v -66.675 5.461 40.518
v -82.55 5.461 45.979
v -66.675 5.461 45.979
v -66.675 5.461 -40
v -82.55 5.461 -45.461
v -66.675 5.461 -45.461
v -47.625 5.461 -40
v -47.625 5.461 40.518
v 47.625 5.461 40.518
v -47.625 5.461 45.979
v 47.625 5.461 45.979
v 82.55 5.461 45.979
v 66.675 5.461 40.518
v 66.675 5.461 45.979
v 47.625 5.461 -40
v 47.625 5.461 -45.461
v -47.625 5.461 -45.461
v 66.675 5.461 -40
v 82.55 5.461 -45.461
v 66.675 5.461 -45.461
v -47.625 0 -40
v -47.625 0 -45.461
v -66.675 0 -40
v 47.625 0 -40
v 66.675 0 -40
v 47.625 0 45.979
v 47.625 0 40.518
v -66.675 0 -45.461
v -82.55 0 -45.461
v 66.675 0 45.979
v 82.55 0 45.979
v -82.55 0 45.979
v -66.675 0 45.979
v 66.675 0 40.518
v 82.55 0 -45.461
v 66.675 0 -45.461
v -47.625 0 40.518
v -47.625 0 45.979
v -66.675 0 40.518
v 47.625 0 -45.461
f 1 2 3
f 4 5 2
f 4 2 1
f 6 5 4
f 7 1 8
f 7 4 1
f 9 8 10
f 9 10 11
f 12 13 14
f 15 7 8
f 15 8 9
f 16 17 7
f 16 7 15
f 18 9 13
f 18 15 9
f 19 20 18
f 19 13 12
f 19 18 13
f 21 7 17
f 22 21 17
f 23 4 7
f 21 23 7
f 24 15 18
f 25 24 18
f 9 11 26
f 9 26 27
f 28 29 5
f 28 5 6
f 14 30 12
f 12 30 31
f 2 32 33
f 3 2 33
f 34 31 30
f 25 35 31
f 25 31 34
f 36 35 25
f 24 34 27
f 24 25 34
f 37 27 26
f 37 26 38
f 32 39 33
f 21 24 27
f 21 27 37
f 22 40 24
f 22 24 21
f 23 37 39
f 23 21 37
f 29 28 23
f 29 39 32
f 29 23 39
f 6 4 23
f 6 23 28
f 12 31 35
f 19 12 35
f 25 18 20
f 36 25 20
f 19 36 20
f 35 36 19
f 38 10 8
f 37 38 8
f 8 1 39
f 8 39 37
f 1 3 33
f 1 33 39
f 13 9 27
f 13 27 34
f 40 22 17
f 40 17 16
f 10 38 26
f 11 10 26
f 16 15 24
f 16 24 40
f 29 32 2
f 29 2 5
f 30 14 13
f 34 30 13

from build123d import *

# Parameters (mm, degrees)
SKETCH1_W           = 165.1
SKETCH1_H           = 91.44
BOSS_EXTRUDE1_DEPTH = 5.461
SKETCH2_W           = 19.05
SKETCH2_H           = 5.461
CUT_EXTRUDE1_DEPTH  = 6.461
BOSS_EXTRUDE2_DEPTH = 5.461


with BuildPart() as part:
    # Sketch1 → Boss-Extrude1 (new body)
    with BuildSketch(Plane(origin=(0, 0, 0), x_dir=(1, 0, 0), z_dir=(0, 1, 0))):
        with Locations((0, -0.259)):
            Rectangle(SKETCH1_W, SKETCH1_H)
        with BuildLine():
            Line((-47.5, 40), (47.5, 40))
            ThreePointArc((47.5, 40), (52.803300859, 37.803300859), (55, 32.5))
            Line((55, 32.5), (55, -32.5))
            ThreePointArc((55, -32.5), (52.803300859, -37.803300859), (47.5, -40))
            Line((47.5, -40), (-47.5, -40))
            ThreePointArc((-47.5, -40), (-52.803300859, -37.803300859), (-55, -32.5))
            Line((-55, -32.5), (-55, 32.5))
            ThreePointArc((-55, 32.5), (-52.803300859, 37.803300859), (-47.5, 40))
        make_face(mode=Mode.SUBTRACT)
    extrude(amount=BOSS_EXTRUDE1_DEPTH)

    # Sketch2 → Cut-Extrude1 (cut, through all)
    with BuildSketch(Plane(origin=(0, 5.461, 0), x_dir=(1, 0, 0), z_dir=(0, 1, 0))):
        with Locations((-57.15, 42.7305)):
            Rectangle(SKETCH2_W, SKETCH2_H)
        with Locations((-57.15, -43.2485)):
            Rectangle(SKETCH2_W, SKETCH2_H)
        with Locations((57.15, -43.2485)):
            Rectangle(SKETCH2_W, SKETCH2_H)
        with Locations((57.15, 42.7305)):
            Rectangle(SKETCH2_W, SKETCH2_H)
    extrude(amount=-CUT_EXTRUDE1_DEPTH, mode=Mode.SUBTRACT)

    # Sketch1<3> → Boss-Extrude2 (add)
    with BuildSketch(Plane(origin=(0, 0, 0), x_dir=(1, 0, 0), z_dir=(0, 1, 0))):
        with BuildLine():
            Line((-47.5, 40), (47.5, 40))
            ThreePointArc((47.5, 40), (52.803300859, 37.803300859), (55, 32.5))
            Line((55, 32.5), (55, -32.5))
            ThreePointArc((55, -32.5), (52.803300859, -37.803300859), (47.5, -40))
            Line((47.5, -40), (-47.5, -40))
            ThreePointArc((-47.5, -40), (-52.803300859, -37.803300859), (-55, -32.5))
            Line((-55, -32.5), (-55, 32.5))
            ThreePointArc((-55, 32.5), (-52.803300859, 37.803300859), (-47.5, 40))
        make_face()
    extrude(amount=BOSS_EXTRUDE2_DEPTH)


solid = part.part
